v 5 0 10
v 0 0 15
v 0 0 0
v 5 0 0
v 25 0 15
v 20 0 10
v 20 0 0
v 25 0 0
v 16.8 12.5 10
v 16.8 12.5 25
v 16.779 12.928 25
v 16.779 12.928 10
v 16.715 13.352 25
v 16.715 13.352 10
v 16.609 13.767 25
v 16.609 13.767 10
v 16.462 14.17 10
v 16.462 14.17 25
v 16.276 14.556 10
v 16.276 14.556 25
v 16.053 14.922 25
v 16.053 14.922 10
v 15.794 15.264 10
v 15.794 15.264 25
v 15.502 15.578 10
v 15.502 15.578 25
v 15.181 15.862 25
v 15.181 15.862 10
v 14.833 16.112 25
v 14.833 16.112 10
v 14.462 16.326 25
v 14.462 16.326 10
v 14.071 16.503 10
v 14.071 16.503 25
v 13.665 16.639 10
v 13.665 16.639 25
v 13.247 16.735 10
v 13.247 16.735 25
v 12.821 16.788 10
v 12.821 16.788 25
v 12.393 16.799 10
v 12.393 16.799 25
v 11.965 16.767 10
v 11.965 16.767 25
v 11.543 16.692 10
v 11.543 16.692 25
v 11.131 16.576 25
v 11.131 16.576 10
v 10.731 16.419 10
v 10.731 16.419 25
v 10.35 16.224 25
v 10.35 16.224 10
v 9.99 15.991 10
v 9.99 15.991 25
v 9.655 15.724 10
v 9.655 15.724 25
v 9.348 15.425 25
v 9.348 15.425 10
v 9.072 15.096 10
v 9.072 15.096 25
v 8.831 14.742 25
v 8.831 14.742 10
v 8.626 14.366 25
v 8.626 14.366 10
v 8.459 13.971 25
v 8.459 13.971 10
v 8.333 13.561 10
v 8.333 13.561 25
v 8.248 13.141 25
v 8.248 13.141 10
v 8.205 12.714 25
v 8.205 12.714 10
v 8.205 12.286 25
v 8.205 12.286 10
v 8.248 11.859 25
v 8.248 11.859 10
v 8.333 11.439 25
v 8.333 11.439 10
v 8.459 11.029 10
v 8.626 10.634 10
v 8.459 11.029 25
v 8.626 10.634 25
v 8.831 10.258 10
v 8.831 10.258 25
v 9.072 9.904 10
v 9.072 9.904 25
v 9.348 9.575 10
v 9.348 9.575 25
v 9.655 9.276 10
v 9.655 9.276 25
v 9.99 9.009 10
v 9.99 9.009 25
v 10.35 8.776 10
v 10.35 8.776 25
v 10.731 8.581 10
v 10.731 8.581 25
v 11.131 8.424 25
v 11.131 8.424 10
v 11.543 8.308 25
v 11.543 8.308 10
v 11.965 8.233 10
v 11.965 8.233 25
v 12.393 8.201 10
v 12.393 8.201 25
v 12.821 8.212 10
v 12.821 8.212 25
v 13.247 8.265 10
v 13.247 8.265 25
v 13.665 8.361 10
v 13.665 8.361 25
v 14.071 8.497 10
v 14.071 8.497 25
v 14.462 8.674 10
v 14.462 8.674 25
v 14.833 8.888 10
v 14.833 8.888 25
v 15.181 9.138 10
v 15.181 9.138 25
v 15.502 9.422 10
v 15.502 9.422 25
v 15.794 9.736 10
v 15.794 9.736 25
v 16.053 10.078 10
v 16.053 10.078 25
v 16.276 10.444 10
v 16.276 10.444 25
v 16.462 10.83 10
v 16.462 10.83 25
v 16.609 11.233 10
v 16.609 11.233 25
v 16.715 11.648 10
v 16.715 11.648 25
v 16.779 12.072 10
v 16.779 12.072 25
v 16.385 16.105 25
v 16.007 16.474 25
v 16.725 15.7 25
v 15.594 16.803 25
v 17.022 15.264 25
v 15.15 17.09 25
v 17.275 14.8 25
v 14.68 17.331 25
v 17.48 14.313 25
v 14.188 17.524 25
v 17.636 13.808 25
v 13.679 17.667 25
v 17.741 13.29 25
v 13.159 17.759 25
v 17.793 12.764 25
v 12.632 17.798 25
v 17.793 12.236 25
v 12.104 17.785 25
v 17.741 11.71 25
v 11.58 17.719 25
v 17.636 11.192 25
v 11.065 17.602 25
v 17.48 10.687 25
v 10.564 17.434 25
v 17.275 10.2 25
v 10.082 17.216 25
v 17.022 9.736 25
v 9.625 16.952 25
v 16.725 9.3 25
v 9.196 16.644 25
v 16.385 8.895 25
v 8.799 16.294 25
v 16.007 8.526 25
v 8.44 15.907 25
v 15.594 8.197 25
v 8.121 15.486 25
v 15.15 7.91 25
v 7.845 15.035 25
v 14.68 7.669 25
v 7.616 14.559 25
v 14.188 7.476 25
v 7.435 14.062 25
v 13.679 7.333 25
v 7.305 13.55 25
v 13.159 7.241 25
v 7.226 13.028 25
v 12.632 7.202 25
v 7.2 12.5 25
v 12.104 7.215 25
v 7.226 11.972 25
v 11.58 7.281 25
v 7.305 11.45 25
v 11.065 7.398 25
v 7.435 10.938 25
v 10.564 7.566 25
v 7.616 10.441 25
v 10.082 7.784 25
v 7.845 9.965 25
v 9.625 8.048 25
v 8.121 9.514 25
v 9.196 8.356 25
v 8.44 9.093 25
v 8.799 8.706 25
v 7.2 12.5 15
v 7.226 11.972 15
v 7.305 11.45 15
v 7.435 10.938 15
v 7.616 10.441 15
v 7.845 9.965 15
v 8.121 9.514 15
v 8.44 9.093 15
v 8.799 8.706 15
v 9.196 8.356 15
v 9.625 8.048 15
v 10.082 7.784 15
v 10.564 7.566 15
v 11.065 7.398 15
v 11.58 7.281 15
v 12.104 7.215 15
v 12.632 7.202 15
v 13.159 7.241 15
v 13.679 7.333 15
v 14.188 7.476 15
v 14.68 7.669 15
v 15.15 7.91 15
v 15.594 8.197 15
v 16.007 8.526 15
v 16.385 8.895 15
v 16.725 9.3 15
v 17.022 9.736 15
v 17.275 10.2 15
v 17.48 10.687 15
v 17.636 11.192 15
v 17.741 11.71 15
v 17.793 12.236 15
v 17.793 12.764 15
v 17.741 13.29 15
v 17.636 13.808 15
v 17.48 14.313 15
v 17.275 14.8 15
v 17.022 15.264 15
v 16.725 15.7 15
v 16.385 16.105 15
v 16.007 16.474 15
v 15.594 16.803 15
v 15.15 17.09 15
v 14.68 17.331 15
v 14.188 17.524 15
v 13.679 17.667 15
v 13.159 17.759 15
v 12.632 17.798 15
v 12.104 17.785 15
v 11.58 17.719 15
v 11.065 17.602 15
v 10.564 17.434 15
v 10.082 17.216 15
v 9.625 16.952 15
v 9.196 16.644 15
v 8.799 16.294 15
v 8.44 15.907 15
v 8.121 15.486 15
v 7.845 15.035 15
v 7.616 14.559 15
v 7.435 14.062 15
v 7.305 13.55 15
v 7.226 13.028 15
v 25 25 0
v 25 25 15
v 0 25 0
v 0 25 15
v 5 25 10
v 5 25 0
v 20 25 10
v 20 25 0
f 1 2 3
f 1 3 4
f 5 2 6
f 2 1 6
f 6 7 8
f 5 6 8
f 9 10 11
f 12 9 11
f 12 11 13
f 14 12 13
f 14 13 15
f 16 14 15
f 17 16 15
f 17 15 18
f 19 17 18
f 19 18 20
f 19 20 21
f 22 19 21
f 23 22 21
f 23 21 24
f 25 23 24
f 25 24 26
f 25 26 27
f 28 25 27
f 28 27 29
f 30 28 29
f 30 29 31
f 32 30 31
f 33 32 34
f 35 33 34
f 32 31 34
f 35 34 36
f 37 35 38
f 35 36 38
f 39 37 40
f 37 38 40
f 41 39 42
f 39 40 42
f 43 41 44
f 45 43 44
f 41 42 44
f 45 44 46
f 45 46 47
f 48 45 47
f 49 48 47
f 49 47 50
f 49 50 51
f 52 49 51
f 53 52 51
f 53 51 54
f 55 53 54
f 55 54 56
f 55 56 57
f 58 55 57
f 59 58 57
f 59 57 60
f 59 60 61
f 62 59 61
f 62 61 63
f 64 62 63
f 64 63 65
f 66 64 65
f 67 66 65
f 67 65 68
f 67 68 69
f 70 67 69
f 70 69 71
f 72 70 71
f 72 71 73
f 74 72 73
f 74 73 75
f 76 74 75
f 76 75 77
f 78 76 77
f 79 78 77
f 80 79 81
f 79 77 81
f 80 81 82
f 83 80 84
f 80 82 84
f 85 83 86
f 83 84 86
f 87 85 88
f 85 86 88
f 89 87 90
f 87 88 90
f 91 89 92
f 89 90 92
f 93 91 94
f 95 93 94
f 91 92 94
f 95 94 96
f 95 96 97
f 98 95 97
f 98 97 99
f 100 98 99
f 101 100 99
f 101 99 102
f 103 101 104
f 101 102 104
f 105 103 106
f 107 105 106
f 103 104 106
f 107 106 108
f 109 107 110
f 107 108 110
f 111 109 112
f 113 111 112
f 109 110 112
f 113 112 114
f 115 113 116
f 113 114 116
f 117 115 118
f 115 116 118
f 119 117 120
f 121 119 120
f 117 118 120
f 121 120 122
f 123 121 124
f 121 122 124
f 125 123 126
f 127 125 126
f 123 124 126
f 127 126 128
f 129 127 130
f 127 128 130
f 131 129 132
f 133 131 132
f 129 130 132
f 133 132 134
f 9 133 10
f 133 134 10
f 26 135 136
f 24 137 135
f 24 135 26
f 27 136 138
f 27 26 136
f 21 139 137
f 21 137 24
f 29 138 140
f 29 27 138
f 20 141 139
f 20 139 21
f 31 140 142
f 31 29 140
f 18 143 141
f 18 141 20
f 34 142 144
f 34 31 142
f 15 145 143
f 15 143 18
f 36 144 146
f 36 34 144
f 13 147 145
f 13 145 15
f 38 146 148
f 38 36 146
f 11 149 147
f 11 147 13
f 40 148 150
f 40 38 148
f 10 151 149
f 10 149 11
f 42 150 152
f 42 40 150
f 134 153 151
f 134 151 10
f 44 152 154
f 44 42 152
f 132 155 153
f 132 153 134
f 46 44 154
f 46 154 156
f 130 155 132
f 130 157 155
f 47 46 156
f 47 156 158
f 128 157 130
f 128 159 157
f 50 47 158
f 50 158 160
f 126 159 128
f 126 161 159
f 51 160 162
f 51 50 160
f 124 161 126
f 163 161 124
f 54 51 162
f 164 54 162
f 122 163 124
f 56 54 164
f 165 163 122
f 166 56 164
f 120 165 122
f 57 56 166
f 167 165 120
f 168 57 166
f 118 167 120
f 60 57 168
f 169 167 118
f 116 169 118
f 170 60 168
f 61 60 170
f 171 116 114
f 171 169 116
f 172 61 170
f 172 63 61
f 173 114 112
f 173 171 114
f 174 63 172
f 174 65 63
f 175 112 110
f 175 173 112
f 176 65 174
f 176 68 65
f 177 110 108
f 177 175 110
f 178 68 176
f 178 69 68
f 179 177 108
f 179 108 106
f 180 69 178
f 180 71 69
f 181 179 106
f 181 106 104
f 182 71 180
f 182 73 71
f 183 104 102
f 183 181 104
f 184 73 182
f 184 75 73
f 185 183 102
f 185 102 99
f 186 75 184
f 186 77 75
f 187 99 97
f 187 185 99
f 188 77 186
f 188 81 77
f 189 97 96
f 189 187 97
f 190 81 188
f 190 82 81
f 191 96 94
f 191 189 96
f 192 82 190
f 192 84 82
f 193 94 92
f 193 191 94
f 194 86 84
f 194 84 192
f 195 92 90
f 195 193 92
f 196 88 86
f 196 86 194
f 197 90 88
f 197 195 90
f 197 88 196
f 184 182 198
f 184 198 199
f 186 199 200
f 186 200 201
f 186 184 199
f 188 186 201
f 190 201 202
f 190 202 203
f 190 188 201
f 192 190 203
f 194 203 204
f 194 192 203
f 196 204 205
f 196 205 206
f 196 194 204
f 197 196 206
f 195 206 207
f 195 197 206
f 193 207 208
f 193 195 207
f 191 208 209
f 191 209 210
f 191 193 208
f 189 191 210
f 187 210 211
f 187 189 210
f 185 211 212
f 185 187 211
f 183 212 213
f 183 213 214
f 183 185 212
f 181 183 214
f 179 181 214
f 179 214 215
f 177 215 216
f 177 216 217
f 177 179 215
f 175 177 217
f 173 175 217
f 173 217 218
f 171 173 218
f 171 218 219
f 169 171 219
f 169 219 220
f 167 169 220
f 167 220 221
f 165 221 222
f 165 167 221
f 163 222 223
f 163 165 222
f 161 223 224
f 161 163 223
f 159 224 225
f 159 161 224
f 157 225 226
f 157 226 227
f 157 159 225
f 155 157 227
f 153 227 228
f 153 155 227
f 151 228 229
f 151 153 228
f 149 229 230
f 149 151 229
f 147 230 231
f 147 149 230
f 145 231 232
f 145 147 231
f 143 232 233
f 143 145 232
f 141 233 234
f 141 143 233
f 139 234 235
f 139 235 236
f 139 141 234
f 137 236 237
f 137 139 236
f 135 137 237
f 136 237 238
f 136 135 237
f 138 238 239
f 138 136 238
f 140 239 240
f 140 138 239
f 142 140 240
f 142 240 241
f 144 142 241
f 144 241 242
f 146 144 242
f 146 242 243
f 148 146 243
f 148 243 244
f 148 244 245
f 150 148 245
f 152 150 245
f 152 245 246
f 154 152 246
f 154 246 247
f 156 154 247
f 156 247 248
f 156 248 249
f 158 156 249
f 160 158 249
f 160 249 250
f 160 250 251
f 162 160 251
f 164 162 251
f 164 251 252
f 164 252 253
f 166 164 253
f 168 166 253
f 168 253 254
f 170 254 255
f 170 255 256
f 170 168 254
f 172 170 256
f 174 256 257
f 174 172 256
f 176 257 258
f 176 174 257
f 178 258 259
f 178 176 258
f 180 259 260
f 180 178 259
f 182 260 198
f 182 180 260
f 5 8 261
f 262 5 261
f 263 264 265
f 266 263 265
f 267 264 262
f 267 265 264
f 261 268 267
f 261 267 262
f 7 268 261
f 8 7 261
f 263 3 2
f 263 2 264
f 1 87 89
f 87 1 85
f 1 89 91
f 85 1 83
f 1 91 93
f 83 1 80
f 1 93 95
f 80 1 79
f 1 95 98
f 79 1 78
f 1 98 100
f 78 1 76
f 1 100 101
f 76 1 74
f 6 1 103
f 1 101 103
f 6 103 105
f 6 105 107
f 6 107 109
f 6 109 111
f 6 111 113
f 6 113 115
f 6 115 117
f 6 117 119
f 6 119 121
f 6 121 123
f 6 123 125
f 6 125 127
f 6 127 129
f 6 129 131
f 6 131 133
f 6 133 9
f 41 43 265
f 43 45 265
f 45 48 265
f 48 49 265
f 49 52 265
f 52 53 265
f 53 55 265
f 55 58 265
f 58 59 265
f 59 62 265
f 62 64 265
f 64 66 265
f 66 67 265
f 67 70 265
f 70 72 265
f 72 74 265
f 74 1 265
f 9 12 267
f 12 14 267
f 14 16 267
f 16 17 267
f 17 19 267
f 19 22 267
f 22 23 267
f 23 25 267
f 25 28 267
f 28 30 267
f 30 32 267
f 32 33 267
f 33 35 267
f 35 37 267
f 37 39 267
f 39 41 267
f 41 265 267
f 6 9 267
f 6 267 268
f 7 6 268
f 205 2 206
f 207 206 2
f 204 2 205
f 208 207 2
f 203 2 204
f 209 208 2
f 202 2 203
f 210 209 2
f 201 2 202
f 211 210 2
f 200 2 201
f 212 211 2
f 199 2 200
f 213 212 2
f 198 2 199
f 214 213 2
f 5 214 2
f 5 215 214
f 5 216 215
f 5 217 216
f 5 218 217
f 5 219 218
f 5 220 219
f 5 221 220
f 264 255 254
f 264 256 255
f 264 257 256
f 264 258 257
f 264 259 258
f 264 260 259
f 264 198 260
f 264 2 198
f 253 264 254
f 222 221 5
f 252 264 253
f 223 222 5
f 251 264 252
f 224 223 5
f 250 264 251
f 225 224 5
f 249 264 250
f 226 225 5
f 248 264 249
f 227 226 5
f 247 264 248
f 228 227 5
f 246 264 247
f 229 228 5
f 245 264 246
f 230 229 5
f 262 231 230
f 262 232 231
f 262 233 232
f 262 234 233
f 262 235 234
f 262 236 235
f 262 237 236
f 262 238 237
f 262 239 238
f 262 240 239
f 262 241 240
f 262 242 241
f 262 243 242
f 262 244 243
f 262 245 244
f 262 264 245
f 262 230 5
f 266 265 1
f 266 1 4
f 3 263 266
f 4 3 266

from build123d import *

# Parameters (mm, degrees)
SKETCH1_W           = 25
SKETCH1_H           = 25
BOSS_EXTRUDE1_DEPTH = 15
SKETCH2_R           = 4.3
CUT_EXTRUDE1_DEPTH  = 39.405728739
BOSS_EXTRUDE2_START = 10
SKETCH3_R           = 5.3
SKETCH3_R_2         = 4.3
BOSS_EXTRUDE2_DEPTH = 10
SKETCH4_W           = 15
SKETCH4_H           = 10
CUT_EXTRUDE2_DEPTH  = 28


with BuildPart() as part:
    # Sketch1 → Boss-Extrude1 (new body)
    with BuildSketch(Plane.XY):
        with Locations((12.5, 12.5)):
            Rectangle(SKETCH1_W, SKETCH1_H)
    extrude(amount=BOSS_EXTRUDE1_DEPTH)

    # Sketch2 → Cut-Extrude1 (cut, through all)
    with BuildSketch(Plane.XY.offset(15)):
        with Locations((12.5, 12.5)):
            Circle(SKETCH2_R)
    extrude(amount=-CUT_EXTRUDE1_DEPTH, mode=Mode.SUBTRACT)

    # Sketch3 → Boss-Extrude2 (add)
    with BuildSketch(Plane.XY.offset(15).offset(BOSS_EXTRUDE2_START)):
        with Locations(Location((12.5, 12.5, 0), (0, 0, 180))):
            Circle(SKETCH3_R)
        with Locations((12.5, 12.5)):
            Circle(SKETCH3_R_2, mode=Mode.SUBTRACT)
    extrude(amount=-BOSS_EXTRUDE2_DEPTH)

    # Sketch4 → Cut-Extrude2 (cut)
    with BuildSketch(Plane(origin=(0, 25, 0), x_dir=(1, 0, 0), z_dir=(0, 1, 0))):
        with Locations((12.5, -5)):
            Rectangle(SKETCH4_W, SKETCH4_H)
    extrude(amount=-CUT_EXTRUDE2_DEPTH, mode=Mode.SUBTRACT)


solid = part.part
